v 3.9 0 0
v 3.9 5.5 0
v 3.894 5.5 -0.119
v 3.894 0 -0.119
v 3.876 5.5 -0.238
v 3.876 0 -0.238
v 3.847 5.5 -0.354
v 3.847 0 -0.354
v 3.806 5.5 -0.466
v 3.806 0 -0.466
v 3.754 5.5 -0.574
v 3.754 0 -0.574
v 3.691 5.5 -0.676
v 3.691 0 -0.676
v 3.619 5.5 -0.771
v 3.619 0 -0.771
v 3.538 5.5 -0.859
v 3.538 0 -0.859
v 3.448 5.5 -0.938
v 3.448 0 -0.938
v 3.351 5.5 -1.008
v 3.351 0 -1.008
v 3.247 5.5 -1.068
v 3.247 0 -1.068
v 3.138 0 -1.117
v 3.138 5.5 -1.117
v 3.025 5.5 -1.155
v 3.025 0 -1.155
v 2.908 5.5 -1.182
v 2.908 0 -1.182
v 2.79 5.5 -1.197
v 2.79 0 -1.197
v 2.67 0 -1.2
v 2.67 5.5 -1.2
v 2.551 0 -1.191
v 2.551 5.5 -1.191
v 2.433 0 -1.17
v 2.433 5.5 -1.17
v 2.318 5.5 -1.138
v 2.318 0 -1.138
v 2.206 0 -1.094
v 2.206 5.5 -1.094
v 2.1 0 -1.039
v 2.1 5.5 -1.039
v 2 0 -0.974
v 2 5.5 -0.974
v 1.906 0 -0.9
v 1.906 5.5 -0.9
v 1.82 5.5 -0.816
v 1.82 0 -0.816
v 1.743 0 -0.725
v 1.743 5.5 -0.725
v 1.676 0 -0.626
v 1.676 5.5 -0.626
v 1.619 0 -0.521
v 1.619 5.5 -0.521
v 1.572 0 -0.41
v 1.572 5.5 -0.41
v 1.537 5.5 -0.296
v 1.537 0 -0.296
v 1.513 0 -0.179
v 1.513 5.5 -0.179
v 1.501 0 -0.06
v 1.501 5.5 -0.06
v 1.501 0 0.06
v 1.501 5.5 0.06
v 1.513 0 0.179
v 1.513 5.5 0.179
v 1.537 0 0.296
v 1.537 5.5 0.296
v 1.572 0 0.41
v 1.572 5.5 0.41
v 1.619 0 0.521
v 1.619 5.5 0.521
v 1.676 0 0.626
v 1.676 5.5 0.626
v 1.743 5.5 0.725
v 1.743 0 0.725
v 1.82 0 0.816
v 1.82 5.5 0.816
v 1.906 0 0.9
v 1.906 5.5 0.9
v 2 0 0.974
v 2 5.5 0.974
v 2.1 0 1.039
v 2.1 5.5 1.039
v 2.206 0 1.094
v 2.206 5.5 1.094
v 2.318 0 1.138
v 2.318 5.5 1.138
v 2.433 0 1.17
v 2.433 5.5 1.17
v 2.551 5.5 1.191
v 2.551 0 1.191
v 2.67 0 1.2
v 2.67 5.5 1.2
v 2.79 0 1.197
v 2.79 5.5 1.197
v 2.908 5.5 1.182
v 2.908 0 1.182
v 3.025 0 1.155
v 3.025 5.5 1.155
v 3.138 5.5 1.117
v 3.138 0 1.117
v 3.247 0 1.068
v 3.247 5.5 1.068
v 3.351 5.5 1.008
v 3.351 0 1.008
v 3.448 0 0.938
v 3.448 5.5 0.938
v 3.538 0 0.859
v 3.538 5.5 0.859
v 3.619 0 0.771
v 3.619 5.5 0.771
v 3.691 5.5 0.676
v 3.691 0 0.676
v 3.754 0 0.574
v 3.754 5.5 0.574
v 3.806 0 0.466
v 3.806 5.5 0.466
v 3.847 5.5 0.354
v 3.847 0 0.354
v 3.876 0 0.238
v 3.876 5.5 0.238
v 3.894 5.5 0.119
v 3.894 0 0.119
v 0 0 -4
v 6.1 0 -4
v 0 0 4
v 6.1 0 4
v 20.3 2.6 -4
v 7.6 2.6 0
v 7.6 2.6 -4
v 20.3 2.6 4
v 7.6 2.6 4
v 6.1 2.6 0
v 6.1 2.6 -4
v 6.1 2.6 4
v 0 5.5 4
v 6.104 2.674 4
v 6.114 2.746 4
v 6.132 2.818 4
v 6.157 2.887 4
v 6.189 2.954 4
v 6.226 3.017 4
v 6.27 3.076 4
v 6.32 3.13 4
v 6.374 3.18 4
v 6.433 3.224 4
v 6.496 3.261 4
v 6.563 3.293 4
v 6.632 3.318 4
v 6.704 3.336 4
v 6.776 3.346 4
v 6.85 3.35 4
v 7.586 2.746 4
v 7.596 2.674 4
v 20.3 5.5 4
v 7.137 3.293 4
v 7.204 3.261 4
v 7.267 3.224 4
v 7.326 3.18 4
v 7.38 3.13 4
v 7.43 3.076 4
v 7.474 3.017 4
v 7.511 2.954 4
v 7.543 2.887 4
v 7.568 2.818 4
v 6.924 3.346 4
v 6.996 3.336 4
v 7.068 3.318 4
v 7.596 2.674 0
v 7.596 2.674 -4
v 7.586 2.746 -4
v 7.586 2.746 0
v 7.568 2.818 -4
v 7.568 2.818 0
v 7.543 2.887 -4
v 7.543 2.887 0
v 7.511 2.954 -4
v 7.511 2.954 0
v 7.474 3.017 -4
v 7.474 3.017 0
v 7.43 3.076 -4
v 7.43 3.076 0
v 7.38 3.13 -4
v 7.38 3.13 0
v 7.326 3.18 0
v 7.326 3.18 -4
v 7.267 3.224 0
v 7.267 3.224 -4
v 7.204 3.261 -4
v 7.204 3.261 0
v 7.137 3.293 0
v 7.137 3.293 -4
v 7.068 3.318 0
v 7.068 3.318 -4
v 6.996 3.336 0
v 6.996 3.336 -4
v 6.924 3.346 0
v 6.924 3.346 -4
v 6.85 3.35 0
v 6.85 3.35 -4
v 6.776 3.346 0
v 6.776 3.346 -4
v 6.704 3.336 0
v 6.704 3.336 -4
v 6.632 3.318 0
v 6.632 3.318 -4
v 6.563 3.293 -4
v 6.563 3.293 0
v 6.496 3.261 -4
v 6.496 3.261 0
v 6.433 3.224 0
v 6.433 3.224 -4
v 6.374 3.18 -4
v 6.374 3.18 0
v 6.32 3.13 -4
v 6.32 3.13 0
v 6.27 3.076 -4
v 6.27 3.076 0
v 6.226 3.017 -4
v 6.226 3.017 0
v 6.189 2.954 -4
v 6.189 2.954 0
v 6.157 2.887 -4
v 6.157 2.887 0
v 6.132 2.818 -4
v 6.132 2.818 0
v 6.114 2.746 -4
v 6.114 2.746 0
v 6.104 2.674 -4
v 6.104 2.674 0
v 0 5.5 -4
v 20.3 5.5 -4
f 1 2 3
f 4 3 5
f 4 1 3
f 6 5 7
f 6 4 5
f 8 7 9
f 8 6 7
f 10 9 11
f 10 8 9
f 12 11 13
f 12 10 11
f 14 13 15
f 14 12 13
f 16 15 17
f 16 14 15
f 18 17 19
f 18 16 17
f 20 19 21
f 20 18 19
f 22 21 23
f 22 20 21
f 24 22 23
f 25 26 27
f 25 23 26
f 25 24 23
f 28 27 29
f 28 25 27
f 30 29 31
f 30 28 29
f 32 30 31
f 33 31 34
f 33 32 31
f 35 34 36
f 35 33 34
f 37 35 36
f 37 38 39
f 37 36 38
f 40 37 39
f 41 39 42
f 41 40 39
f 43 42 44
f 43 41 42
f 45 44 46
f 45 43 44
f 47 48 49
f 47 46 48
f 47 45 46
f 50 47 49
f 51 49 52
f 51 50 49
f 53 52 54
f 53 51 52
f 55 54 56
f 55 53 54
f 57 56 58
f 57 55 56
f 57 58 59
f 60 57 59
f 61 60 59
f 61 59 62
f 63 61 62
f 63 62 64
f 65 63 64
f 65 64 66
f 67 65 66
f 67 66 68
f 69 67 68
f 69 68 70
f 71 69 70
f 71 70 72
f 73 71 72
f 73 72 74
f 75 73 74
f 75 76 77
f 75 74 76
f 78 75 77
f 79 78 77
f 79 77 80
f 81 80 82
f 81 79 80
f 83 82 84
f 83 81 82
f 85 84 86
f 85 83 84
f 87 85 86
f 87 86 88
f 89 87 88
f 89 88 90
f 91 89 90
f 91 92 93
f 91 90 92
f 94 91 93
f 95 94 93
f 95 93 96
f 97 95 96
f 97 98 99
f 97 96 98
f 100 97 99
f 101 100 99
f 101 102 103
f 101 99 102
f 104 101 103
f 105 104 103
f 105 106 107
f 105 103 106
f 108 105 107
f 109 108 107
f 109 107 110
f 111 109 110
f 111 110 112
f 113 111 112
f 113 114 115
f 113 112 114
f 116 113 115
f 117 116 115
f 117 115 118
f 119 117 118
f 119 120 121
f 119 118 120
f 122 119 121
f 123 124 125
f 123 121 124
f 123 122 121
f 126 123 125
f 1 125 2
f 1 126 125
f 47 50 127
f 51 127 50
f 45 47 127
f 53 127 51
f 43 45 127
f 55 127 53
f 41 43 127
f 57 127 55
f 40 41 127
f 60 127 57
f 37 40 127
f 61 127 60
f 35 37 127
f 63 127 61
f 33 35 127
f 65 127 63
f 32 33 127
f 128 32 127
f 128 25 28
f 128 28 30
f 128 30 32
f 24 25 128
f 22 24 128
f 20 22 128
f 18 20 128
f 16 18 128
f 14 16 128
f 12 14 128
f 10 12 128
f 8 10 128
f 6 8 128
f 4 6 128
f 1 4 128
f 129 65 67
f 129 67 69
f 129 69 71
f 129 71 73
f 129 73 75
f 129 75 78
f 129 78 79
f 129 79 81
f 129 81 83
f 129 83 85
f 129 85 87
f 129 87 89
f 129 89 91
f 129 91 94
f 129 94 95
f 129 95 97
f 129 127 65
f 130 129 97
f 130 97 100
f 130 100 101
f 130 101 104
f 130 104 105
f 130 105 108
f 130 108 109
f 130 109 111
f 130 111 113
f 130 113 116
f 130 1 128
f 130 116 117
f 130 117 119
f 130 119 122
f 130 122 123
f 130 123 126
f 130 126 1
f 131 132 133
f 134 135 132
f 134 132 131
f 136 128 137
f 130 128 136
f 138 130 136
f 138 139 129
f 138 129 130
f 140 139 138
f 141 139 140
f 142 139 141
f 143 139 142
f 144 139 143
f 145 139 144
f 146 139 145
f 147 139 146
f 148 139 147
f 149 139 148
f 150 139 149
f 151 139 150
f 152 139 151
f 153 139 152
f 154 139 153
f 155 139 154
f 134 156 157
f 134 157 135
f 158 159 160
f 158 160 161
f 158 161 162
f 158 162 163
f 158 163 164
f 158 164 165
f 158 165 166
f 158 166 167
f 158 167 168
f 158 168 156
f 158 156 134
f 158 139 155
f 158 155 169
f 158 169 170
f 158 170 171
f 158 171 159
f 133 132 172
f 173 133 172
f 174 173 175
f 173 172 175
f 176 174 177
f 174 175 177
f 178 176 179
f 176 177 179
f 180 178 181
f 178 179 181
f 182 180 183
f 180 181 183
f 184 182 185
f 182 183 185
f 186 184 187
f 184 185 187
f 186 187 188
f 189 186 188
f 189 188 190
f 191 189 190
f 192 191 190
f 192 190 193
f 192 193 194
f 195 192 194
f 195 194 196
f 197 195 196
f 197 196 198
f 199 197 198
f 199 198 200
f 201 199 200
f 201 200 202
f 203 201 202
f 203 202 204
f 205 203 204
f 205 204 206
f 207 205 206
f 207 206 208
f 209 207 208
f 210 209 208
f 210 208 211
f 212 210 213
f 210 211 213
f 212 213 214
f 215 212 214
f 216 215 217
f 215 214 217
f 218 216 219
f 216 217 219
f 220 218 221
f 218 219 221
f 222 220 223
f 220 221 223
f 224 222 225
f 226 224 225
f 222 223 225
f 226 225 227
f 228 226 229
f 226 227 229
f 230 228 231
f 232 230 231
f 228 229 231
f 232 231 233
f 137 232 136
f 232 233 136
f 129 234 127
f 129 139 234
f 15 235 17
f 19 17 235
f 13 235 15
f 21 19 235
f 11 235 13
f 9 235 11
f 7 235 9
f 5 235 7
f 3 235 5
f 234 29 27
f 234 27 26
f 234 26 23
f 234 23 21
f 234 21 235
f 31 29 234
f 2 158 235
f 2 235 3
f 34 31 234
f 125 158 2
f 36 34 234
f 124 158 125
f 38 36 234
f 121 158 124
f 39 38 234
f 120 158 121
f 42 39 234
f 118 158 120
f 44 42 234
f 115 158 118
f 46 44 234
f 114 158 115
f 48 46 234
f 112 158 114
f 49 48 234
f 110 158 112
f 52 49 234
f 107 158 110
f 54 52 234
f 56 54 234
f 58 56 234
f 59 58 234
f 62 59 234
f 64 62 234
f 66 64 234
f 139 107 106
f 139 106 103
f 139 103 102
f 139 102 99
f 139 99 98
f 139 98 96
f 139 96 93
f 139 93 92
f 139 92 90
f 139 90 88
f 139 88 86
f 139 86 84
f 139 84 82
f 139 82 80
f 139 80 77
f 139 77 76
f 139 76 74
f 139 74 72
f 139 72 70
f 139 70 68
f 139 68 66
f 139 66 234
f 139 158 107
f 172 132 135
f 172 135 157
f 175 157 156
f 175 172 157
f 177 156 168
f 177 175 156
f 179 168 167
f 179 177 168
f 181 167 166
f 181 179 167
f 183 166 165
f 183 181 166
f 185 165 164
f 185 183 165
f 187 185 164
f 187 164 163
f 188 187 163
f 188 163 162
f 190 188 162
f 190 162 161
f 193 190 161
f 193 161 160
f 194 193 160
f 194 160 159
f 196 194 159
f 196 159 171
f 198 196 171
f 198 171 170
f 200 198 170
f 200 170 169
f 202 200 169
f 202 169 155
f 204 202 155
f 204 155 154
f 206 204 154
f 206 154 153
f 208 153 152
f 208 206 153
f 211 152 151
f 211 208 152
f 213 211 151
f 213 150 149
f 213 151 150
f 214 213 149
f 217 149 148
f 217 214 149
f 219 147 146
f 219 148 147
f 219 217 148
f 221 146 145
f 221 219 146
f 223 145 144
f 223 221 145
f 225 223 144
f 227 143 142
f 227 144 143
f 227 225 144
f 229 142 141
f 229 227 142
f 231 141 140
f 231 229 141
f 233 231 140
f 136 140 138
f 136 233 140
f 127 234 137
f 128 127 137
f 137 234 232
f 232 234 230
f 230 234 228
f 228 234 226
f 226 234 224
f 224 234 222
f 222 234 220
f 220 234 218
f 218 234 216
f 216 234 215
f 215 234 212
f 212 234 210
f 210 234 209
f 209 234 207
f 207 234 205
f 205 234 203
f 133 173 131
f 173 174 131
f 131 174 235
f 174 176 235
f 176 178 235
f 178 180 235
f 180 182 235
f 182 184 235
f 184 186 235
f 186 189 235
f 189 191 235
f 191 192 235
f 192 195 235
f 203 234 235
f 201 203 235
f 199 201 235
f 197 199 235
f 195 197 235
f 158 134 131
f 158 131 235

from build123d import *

# Parameters (mm, degrees)
BOSS_EXTRUDE2_DEPTH     = 4
SKETCH2_R               = 1.2
CUT_EXTRUDE2_DEPTH      = 6.5
CUT_EXTRUDE2_DEPTH_BACK = 1
SKETCH3_R               = 0.75
CUT_EXTRUDE3_DEPTH      = 5
CUT_EXTRUDE3_DEPTH_BACK = 5


with BuildPart() as part:
    # Sketch1 → Boss-Extrude2 (new body, symmetric)
    with BuildSketch(Plane.XY):
        Polygon((0, 0), (6.1, 0), (6.1, 2.6), (20.3, 2.6), (20.3, 5.5), (0, 5.5), align=None)
    extrude(amount=BOSS_EXTRUDE2_DEPTH, both=True)

    # Sketch2 → Cut-Extrude2 (cut, two sides)
    with BuildSketch(Plane(origin=(0, 0, 0), x_dir=(1, 0, 0), z_dir=(0, 1, 0))) as cut_extrude2_sk:
        with Locations((2.7, 0)):
            Circle(SKETCH2_R)
    extrude(amount=CUT_EXTRUDE2_DEPTH, mode=Mode.SUBTRACT)
    extrude(cut_extrude2_sk.sketch, amount=-CUT_EXTRUDE2_DEPTH_BACK, mode=Mode.SUBTRACT)

    # Sketch3 → Cut-Extrude3 (cut, two sides)
    with BuildSketch(Plane.XY) as cut_extrude3_sk:
        with Locations((6.85, 2.6)):
            Circle(SKETCH3_R)
    extrude(amount=CUT_EXTRUDE3_DEPTH, mode=Mode.SUBTRACT)
    extrude(cut_extrude3_sk.sketch, amount=-CUT_EXTRUDE3_DEPTH_BACK, mode=Mode.SUBTRACT)


solid = part.part
